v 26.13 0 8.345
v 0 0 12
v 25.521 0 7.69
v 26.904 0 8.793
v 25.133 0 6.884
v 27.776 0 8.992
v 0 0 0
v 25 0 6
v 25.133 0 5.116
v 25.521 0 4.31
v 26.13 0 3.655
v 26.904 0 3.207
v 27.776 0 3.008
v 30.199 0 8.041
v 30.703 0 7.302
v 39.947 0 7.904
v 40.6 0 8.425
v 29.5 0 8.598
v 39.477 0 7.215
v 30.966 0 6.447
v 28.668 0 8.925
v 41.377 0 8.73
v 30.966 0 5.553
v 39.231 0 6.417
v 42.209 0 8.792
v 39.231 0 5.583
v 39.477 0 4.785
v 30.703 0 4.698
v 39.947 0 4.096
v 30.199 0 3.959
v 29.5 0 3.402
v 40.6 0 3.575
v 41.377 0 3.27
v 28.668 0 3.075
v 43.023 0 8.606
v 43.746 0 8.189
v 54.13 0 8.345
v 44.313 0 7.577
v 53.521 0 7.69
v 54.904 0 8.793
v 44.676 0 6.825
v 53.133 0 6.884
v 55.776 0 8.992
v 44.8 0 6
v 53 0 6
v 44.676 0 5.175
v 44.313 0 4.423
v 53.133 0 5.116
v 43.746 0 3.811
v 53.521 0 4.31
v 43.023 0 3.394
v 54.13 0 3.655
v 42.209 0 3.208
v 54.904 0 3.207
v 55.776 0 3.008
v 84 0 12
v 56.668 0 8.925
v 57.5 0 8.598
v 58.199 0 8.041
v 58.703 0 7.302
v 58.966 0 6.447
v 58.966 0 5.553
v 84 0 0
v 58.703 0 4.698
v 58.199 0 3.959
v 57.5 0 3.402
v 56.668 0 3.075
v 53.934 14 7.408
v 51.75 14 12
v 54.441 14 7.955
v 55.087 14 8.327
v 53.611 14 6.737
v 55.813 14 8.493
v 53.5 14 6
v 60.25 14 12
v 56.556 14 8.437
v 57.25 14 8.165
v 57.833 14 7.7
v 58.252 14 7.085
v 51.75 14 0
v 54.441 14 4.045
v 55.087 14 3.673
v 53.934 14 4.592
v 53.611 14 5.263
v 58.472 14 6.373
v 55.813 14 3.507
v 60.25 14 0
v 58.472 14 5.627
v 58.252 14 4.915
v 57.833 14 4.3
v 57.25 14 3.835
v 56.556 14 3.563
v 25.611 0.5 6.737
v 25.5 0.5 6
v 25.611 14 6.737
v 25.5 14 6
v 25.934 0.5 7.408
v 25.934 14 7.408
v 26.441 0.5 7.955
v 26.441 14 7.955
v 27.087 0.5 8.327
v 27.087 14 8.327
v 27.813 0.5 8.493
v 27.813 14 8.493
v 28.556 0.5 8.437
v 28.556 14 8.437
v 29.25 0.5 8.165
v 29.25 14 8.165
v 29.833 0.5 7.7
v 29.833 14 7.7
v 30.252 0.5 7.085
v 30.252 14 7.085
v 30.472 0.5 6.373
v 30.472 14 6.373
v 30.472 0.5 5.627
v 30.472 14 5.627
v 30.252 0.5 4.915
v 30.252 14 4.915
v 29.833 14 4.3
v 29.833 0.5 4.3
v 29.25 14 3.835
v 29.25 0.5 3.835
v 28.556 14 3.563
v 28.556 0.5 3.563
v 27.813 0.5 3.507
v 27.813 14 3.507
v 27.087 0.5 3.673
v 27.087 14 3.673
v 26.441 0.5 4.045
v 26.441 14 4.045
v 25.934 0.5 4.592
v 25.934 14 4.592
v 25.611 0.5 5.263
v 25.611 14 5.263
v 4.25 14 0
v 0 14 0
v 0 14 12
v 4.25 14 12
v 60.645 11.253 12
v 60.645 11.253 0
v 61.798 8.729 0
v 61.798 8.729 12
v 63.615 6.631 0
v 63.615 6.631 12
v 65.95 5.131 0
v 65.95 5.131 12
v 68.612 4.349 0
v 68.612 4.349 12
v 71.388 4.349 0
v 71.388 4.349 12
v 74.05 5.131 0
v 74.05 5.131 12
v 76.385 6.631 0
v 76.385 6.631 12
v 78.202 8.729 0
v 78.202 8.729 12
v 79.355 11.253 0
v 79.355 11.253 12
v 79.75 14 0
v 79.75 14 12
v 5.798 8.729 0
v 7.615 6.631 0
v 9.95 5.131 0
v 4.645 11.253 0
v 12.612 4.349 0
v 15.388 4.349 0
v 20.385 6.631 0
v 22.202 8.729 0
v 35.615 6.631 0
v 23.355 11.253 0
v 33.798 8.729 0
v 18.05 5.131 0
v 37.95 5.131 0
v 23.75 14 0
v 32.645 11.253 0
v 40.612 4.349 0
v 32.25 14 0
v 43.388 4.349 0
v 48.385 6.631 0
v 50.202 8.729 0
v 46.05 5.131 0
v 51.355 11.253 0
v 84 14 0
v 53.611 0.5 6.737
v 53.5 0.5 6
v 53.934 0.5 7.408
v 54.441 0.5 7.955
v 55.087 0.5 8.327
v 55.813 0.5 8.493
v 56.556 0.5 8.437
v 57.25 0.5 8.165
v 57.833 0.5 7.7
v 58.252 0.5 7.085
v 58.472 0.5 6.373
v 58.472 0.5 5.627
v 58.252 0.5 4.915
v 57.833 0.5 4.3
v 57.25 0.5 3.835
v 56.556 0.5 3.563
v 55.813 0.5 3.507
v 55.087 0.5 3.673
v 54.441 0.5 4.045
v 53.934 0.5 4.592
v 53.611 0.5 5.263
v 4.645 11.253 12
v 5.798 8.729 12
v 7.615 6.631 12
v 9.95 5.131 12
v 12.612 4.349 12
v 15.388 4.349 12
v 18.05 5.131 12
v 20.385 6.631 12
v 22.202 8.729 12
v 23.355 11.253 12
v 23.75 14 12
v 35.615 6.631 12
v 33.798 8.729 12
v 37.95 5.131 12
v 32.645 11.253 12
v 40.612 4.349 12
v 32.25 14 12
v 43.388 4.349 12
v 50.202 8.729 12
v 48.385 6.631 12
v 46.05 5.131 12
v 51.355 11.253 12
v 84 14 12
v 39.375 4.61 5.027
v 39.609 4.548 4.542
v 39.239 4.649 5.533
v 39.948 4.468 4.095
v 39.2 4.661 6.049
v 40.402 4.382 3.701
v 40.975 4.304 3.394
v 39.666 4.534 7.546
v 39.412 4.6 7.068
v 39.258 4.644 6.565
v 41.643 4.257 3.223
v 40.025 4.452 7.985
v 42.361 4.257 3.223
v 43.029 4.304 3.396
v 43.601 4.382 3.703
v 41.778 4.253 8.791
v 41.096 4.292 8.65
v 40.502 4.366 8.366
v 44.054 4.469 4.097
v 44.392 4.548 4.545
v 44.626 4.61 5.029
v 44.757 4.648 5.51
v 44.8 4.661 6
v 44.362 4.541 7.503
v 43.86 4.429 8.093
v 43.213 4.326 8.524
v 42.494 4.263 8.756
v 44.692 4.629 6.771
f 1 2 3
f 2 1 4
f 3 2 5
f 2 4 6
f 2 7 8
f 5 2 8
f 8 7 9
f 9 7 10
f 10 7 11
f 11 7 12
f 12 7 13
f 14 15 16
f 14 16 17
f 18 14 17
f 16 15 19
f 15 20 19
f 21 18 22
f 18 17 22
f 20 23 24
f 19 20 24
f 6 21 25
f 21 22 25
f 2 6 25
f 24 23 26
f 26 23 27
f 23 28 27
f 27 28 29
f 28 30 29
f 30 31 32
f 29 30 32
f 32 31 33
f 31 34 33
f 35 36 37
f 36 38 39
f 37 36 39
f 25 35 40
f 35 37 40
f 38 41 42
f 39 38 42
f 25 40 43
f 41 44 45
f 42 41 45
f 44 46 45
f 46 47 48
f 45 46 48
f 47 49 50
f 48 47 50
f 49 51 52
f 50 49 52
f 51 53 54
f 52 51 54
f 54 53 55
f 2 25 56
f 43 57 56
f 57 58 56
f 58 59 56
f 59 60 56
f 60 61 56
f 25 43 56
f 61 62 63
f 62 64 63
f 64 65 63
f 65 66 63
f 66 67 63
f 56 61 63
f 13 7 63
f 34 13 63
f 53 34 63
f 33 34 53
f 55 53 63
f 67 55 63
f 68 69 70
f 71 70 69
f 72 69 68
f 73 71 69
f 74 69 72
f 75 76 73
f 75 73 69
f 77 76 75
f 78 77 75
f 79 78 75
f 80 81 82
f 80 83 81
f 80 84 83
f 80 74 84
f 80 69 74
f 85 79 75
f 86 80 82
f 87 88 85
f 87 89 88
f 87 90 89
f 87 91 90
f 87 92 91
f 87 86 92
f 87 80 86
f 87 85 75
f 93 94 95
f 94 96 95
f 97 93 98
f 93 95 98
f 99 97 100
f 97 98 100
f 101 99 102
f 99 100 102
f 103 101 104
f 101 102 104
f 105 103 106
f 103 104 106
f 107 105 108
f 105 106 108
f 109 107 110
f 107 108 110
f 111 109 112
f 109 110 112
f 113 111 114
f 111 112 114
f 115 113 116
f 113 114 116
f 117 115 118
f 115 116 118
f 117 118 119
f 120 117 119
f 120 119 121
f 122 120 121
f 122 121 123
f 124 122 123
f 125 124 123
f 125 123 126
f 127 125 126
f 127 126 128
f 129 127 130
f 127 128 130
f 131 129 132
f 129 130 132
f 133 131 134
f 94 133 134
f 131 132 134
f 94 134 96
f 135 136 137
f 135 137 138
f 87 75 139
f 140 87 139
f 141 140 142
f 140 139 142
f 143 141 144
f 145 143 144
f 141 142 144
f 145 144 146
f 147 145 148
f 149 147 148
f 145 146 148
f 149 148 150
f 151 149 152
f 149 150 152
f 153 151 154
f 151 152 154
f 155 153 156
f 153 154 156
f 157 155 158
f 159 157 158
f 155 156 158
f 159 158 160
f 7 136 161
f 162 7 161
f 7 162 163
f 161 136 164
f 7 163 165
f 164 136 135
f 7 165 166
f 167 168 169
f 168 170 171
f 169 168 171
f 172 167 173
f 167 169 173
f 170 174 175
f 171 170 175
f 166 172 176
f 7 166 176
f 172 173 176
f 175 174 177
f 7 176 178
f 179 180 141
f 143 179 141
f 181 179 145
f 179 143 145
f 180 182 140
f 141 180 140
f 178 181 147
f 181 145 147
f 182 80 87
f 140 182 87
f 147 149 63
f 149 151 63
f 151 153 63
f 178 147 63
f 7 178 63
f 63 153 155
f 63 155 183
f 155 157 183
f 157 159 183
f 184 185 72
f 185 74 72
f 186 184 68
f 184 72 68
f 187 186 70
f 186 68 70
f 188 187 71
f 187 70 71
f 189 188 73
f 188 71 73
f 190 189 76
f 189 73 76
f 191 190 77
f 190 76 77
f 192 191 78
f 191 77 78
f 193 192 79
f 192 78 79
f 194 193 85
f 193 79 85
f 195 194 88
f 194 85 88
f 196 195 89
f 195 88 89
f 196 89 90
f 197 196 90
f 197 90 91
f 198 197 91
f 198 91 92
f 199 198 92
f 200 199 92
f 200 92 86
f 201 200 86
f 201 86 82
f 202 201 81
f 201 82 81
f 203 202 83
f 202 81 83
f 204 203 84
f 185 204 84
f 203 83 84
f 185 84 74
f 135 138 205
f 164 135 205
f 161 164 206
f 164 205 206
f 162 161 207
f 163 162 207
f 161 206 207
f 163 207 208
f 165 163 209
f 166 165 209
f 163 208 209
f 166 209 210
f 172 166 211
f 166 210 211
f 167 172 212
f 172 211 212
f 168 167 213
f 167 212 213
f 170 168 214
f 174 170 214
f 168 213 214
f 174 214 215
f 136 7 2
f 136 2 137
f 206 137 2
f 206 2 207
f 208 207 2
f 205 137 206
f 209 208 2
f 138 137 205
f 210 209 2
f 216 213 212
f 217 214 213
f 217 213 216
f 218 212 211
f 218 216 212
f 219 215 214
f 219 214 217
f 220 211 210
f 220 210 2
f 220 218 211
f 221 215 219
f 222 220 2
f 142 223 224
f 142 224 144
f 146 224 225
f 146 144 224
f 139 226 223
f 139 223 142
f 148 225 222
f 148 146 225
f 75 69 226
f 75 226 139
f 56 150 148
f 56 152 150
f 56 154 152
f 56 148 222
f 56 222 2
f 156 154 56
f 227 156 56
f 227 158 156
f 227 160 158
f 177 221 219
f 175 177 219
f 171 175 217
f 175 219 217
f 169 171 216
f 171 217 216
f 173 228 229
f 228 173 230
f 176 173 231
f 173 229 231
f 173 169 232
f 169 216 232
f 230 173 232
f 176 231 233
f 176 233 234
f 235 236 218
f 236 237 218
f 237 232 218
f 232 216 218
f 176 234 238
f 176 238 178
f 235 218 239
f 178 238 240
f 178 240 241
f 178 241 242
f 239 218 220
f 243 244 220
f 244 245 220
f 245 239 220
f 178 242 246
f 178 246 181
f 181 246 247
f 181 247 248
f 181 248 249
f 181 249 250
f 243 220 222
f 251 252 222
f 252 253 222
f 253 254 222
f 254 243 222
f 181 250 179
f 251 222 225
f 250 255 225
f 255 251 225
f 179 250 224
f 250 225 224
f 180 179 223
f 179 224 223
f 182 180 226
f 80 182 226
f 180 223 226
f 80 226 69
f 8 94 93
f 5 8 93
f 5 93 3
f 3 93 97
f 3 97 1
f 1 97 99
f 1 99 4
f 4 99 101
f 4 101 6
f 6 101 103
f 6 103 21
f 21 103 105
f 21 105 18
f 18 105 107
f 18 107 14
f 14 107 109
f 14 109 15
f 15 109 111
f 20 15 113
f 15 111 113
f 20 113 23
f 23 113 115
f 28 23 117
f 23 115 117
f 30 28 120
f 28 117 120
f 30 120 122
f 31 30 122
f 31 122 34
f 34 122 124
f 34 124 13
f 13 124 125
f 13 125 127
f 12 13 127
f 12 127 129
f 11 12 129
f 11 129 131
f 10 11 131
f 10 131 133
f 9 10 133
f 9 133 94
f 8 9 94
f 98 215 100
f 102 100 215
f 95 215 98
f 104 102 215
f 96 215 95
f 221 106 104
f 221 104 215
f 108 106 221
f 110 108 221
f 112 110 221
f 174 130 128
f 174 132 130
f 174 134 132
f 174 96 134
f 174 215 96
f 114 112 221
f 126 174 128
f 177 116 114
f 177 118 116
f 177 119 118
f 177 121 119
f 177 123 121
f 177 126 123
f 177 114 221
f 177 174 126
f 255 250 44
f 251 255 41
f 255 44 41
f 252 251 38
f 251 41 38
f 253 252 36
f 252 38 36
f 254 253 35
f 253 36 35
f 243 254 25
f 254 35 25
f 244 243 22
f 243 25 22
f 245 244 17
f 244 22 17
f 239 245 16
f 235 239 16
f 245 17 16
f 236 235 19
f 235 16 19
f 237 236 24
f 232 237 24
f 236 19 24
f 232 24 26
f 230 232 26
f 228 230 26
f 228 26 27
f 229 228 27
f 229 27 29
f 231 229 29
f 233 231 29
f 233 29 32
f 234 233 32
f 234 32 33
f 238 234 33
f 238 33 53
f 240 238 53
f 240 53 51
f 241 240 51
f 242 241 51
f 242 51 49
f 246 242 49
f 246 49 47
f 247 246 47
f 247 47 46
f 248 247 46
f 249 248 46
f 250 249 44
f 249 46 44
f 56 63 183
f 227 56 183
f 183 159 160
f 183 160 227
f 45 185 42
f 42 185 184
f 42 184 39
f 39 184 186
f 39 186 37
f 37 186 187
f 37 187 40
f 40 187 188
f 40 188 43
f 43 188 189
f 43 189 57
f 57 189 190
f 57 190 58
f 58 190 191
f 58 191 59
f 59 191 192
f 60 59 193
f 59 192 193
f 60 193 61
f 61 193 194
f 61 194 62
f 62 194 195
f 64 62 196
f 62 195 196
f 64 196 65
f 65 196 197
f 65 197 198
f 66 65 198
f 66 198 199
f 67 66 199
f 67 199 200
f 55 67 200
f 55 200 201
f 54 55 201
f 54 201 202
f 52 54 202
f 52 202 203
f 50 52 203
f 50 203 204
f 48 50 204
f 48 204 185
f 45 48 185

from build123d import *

# Parameters (mm, degrees)
SKETCH_W               = 84
SKETCH_H               = 14
PAD_DEPTH              = 12
SKETCH001_R            = 9.75
POCKET_DEPTH           = 12.001
LINEARPATTERN001_COUNT = 3
LINEARPATTERN001_PITCH = 28
HOLE_D                 = 5
HOLE_CSINK_D           = 6
HOLE_CSINK_ANGLE       = 90
LINEARPATTERN_COUNT    = 2
LINEARPATTERN_PITCH    = 28
SKETCH003_R            = 2.8
POCKET001_DEPTH        = 14.001


with BuildPart() as part:
    # Sketch → Pad (new body)
    with BuildSketch(Plane.XY):
        with Locations((42, 7)):
            Rectangle(SKETCH_W, SKETCH_H)
    extrude(amount=PAD_DEPTH)

    # Sketch001 (on DatumPlane) → Pocket (cut, through all)
    with BuildSketch(Plane.XY.offset(12)):
        with Locations((14, 14)):
            Circle(SKETCH001_R)
    pocket = extrude(amount=-POCKET_DEPTH, mode=Mode.SUBTRACT)

    # LinearPattern001: Pocket ×3
    with Locations(*[(i * LINEARPATTERN001_PITCH, 0, 0) for i in range(1, LINEARPATTERN001_COUNT)]):
        add(pocket, mode=Mode.SUBTRACT)

    # Hole (through all)
    with Locations(Plane.XZ):
        with Locations((28, 6)):
            hole = CounterSinkHole(HOLE_D / 2, HOLE_CSINK_D / 2, counter_sink_angle=HOLE_CSINK_ANGLE)

    # LinearPattern: Hole ×2
    with Locations(*[(i * LINEARPATTERN_PITCH, 0, 0) for i in range(1, LINEARPATTERN_COUNT)]):
        add(hole, mode=Mode.SUBTRACT)

    # Sketch003 → Pocket001 (cut, through all)
    with BuildSketch(Plane.XZ):
        with Locations((42, 6)):
            Circle(SKETCH003_R)
    extrude(amount=-POCKET001_DEPTH, mode=Mode.SUBTRACT)


solid = part.part
